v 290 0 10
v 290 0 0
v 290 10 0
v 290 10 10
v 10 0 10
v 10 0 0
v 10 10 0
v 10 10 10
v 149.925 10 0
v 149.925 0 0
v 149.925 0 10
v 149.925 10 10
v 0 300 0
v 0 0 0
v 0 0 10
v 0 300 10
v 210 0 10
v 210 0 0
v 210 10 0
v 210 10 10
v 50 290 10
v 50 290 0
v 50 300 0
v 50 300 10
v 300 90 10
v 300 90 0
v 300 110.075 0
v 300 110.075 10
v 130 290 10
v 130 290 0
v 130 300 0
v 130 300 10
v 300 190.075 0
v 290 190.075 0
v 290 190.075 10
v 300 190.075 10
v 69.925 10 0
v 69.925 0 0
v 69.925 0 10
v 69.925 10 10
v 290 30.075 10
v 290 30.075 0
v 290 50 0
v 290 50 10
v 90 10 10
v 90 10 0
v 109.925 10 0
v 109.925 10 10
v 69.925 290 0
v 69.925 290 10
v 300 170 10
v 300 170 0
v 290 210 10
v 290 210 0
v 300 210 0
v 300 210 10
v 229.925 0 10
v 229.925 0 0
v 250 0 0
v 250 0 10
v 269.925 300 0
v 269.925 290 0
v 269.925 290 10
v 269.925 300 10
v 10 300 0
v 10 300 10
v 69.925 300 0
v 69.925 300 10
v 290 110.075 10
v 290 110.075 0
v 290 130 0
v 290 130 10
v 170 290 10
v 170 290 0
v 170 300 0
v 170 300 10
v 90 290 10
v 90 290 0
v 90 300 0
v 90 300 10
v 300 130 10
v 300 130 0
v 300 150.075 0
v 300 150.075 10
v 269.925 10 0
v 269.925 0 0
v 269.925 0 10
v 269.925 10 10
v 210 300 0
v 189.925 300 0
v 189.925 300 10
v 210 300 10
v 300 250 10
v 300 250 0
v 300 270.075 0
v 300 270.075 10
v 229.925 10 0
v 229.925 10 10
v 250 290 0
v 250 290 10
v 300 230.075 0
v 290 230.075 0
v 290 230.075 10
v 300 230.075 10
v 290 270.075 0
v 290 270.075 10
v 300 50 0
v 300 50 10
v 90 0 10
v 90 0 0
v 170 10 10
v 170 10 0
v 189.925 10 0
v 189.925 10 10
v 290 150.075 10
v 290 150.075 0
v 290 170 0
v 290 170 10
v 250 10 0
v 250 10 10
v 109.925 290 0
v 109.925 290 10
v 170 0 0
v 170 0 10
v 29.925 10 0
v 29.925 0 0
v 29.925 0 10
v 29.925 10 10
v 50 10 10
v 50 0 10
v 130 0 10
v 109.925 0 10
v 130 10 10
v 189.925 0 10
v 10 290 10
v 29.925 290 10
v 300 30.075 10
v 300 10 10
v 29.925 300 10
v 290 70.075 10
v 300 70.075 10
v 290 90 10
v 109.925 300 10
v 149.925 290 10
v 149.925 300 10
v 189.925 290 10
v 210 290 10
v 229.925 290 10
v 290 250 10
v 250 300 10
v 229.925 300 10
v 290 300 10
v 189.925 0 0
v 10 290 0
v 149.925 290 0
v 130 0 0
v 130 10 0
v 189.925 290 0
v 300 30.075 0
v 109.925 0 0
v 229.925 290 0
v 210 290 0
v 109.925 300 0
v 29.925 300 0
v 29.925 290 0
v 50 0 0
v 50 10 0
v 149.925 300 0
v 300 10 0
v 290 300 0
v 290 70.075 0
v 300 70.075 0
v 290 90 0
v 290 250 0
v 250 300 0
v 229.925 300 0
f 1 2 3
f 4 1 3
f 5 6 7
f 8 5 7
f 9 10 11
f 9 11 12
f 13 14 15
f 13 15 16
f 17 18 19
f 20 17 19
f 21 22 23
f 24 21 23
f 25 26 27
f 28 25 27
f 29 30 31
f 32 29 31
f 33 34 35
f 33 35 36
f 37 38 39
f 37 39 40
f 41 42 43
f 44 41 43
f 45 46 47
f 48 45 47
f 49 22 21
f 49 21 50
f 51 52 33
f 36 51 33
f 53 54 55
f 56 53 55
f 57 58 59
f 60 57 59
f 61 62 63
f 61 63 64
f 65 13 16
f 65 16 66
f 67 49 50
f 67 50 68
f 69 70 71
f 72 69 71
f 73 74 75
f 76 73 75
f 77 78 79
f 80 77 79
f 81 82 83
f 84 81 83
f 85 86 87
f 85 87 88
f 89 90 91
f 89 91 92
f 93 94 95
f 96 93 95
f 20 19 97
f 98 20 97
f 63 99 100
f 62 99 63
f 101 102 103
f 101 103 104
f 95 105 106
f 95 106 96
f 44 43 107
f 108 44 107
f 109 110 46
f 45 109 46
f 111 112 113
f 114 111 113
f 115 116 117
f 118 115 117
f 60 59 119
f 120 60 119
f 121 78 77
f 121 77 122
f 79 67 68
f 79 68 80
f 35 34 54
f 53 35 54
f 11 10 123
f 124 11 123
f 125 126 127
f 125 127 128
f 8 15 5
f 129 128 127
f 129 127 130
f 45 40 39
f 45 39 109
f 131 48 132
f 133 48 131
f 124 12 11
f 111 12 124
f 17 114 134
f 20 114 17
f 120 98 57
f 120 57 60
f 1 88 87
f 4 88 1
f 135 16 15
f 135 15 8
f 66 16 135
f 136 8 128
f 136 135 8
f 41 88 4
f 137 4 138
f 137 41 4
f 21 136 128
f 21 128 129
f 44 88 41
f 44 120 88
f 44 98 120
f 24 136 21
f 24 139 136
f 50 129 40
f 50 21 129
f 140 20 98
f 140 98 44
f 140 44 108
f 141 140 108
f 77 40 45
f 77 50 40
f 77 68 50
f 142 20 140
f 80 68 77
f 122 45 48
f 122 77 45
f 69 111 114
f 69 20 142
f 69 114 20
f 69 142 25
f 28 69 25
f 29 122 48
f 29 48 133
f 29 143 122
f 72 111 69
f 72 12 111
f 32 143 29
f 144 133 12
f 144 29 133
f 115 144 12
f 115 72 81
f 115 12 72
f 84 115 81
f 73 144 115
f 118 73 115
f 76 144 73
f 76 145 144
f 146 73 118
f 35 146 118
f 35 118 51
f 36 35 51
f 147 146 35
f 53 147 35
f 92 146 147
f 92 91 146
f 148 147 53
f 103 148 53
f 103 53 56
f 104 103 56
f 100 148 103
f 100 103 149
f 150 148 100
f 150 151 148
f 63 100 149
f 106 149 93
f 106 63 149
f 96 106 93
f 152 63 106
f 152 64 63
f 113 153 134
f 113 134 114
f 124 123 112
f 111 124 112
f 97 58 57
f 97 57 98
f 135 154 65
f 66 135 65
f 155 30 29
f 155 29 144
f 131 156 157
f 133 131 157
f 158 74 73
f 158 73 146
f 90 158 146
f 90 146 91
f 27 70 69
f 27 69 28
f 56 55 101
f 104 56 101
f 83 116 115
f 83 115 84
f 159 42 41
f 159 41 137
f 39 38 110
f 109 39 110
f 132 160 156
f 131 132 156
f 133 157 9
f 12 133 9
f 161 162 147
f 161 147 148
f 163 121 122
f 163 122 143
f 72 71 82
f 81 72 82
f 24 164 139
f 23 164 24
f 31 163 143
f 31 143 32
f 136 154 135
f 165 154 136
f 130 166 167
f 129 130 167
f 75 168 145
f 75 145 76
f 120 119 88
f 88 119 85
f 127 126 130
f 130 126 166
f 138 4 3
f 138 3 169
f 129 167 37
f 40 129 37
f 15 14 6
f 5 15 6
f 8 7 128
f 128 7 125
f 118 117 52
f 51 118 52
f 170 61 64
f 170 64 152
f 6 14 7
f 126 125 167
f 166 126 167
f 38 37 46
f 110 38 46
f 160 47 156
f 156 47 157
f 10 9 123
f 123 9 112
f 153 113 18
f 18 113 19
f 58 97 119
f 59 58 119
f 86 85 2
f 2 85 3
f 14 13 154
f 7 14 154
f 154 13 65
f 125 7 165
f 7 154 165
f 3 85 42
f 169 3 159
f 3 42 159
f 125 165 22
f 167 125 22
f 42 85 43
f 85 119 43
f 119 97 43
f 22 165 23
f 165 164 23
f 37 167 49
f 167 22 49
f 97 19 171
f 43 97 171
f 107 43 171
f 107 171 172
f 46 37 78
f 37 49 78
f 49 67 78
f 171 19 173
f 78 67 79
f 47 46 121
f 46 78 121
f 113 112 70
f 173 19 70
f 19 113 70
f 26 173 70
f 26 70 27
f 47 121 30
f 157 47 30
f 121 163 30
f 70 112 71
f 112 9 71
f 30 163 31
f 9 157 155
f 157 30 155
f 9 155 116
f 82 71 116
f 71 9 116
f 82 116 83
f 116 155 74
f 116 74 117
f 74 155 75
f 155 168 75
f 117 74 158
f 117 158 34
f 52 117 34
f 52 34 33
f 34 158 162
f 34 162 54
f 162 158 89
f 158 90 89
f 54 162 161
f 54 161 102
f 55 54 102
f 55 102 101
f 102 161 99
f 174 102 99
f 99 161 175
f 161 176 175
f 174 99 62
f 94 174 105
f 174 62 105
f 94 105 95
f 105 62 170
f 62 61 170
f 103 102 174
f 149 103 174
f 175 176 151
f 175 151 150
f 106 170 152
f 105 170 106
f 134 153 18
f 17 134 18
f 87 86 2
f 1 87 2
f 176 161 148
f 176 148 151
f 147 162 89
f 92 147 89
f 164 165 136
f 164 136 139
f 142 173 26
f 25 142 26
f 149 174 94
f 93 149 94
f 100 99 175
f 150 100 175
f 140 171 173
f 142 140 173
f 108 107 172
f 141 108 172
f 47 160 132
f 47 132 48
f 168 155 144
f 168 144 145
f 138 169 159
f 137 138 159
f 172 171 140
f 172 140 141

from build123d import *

# Parameters (mm, degrees)
F0_W     = 300
F0_H     = 300
F1_DEPTH = 10
F2_W     = 19.925
F2_H     = 10
F2_W_2   = 10
F2_H_2   = 19.925
F3_DEPTH = 10.001


with BuildPart() as f1:
    # F0 (on Top) → F1 (new body)
    with BuildSketch(Plane.XY):
        with Locations((150, 150)):
            Rectangle(F0_W, F0_H)
    extrude(amount=F1_DEPTH)

    # F2 (on face) → F3 (cut, through all)
    with BuildSketch(Plane.XY):
        with Locations((19.9625, 5)):
            Rectangle(F2_W, F2_H)
        with Locations((59.9625, 5)):
            Rectangle(F2_W, F2_H)
        with Locations((99.9625, 5)):
            Rectangle(F2_W, F2_H)
        with Locations((139.9625, 5)):
            Rectangle(F2_W, F2_H)
        with Locations((179.9625, 5)):
            Rectangle(F2_W, F2_H)
        with Locations((219.9625, 5)):
            Rectangle(F2_W, F2_H)
        with Locations((259.9625, 5)):
            Rectangle(F2_W, F2_H)
        with Locations((299.9625, 5)):
            Rectangle(F2_W, F2_H)
        with Locations((295, 40.0375)):
            Rectangle(F2_W_2, F2_H_2)
        with Locations((295, 80.0375)):
            Rectangle(F2_W_2, F2_H_2)
        with Locations((295, 120.0375)):
            Rectangle(F2_W_2, F2_H_2)
        with Locations((295, 160.0375)):
            Rectangle(F2_W_2, F2_H_2)
        with Locations((295, 200.0375)):
            Rectangle(F2_W_2, F2_H_2)
        with Locations((295, 240.0375)):
            Rectangle(F2_W_2, F2_H_2)
        with Locations((295, 280.0375)):
            Rectangle(F2_W_2, F2_H_2)
        with Locations((295, 295)):
            Rectangle(F2_W_2, F2_H)
        with Locations((259.9625, 295)):
            Rectangle(F2_W, F2_H)
        with Locations((219.9625, 295)):
            Rectangle(F2_W, F2_H)
        with Locations((179.9625, 295)):
            Rectangle(F2_W, F2_H)
        with Locations((139.9625, 295)):
            Rectangle(F2_W, F2_H)
        with Locations((99.9625, 295)):
            Rectangle(F2_W, F2_H)
        with Locations((59.9625, 295)):
            Rectangle(F2_W, F2_H)
        with Locations((19.9625, 295)):
            Rectangle(F2_W, F2_H)
    extrude(amount=F3_DEPTH, mode=Mode.SUBTRACT)


solid = f1.part
